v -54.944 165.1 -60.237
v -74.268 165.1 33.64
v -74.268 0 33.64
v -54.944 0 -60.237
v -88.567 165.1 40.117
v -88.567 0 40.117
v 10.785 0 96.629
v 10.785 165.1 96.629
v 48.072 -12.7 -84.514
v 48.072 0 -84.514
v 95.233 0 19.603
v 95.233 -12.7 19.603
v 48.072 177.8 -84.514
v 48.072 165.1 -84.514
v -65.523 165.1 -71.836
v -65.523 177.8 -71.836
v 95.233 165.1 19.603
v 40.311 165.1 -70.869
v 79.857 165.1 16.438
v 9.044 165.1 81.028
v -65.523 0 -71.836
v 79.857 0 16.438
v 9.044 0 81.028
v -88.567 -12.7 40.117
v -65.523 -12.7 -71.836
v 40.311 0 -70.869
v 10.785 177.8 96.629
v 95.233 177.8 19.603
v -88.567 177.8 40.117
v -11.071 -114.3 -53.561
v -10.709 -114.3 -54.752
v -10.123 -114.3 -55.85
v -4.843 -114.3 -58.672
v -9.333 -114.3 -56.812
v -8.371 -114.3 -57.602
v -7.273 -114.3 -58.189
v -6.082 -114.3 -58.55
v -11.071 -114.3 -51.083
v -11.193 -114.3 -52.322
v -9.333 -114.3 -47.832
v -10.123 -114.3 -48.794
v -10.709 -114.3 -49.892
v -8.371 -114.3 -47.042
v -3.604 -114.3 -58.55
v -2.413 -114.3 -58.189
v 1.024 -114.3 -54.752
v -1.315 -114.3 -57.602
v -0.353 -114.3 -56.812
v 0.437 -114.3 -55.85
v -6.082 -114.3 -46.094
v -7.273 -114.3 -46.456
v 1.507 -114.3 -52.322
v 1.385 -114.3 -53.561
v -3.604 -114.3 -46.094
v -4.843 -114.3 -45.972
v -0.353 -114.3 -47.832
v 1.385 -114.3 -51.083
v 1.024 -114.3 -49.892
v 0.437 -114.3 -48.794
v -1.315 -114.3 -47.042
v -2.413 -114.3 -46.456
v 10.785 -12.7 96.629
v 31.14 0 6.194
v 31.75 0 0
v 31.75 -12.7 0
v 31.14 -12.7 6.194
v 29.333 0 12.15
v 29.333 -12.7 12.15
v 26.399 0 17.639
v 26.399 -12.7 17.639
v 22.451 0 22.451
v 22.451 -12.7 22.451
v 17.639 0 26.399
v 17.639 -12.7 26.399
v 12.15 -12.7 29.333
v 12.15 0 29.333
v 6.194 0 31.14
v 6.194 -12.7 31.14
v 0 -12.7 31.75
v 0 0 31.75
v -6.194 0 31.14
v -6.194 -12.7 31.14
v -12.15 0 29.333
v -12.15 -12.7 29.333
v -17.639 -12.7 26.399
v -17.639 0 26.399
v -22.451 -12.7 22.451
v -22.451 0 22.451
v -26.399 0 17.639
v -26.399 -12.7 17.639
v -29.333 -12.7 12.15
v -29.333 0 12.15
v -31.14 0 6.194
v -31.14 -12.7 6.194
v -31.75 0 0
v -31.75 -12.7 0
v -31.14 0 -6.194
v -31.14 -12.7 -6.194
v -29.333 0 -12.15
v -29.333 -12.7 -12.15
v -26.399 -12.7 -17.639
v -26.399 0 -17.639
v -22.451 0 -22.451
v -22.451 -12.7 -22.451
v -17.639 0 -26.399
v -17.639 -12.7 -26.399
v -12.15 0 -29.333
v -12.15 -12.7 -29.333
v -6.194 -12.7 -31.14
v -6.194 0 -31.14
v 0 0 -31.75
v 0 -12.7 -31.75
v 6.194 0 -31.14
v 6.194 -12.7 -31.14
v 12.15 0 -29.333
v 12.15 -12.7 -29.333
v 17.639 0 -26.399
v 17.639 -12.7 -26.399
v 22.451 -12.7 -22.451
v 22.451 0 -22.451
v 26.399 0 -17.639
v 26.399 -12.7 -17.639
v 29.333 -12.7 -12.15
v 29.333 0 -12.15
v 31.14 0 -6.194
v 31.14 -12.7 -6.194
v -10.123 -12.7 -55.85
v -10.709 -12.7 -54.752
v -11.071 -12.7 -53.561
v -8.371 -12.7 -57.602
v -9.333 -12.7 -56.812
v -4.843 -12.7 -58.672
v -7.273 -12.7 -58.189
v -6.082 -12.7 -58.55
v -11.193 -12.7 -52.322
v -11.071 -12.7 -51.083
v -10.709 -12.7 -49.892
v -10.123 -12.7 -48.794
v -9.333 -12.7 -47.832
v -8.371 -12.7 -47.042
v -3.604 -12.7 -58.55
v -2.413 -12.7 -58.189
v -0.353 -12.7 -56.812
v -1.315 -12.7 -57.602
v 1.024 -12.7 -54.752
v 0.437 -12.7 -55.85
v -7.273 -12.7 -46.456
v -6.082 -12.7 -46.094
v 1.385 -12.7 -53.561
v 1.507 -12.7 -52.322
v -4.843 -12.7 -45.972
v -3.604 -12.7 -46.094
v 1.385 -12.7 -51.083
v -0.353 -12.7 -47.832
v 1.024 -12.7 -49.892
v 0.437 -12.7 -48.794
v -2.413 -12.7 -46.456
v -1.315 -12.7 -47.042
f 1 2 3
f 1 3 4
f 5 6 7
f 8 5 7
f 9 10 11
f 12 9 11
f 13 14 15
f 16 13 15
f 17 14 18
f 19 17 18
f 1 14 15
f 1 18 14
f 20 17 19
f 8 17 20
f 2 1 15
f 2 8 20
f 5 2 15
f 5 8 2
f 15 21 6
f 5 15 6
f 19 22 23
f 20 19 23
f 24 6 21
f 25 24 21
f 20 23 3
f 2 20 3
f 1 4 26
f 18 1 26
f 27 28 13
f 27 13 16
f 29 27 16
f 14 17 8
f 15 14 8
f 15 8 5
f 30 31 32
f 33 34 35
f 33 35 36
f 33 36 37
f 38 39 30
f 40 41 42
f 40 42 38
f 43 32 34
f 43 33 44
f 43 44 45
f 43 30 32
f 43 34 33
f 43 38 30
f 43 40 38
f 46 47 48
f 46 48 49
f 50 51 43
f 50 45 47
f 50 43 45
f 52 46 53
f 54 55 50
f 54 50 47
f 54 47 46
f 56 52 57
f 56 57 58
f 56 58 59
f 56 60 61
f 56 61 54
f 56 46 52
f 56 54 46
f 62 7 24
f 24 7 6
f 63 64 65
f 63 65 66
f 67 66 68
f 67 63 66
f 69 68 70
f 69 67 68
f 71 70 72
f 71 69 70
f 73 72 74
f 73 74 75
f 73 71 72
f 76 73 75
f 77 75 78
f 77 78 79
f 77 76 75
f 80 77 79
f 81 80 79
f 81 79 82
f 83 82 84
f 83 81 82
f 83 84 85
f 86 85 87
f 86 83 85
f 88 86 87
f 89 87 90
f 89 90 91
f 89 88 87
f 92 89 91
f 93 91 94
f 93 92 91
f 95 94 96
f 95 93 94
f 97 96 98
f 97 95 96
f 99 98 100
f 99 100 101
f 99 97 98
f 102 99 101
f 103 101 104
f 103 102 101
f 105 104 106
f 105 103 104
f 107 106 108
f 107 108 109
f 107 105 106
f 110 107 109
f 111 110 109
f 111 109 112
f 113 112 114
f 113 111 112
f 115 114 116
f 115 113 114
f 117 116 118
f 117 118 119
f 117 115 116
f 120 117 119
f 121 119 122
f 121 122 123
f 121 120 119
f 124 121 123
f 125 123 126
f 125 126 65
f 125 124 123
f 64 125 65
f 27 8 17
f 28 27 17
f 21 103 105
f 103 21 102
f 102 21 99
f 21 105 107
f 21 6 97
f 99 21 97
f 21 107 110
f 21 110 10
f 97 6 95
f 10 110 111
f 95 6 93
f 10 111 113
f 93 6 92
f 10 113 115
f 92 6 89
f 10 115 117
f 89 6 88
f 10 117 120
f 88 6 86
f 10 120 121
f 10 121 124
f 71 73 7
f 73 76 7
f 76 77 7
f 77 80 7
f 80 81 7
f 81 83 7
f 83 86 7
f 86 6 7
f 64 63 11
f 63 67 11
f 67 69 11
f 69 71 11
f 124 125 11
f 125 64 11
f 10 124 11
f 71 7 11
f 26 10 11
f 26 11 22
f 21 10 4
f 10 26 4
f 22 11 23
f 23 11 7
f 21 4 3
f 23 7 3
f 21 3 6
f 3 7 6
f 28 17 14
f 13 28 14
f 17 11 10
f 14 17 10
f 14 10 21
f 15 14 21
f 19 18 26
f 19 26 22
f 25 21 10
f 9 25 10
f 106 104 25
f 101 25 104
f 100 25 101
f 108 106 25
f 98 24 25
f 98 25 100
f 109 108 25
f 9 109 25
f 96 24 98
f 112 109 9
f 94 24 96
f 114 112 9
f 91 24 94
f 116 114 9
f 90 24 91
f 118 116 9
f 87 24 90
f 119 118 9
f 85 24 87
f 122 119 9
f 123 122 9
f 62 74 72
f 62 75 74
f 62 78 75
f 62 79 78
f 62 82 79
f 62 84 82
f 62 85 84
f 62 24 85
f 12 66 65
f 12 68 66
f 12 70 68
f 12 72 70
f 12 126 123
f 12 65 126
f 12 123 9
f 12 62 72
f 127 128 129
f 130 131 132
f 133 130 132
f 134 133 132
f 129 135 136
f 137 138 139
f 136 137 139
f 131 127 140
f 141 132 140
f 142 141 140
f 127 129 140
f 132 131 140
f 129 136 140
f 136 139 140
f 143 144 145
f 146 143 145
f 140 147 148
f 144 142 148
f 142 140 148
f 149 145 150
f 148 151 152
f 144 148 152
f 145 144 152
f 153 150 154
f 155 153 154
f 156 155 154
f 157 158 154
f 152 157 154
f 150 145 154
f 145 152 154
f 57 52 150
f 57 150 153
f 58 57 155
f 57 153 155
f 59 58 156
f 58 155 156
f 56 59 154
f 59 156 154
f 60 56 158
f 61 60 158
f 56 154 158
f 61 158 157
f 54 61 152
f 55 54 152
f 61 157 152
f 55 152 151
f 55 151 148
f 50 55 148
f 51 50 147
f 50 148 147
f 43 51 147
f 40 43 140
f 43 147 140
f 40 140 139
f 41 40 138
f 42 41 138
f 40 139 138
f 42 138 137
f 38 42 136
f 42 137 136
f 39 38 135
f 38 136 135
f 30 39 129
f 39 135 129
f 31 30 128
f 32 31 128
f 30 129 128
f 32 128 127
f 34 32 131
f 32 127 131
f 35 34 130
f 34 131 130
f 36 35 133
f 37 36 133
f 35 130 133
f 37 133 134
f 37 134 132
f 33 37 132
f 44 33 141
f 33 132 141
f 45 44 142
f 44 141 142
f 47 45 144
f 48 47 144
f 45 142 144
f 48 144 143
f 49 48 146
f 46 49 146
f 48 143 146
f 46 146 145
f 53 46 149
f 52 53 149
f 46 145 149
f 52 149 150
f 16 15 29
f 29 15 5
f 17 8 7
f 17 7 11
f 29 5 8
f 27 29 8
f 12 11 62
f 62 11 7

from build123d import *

# Parameters (mm, degrees)
F0_R     = 31.75
F1_DEPTH = 12.7
F3_DEPTH = 165.1
F5_DEPTH = 12.7
F6_R     = 6.35
F7_DEPTH = 101.6


with BuildPart() as f1:
    # F0 (on Front) → F1 (new body)
    with BuildSketch(Plane.XZ):
        Polygon((10.784969, 96.629386), (-88.567268, 40.117238), (-65.522551, -71.835569), (48.072104, -84.514061), (95.232746, 19.603007), align=None)
        Circle(F0_R, mode=Mode.SUBTRACT)
    extrude(amount=F1_DEPTH)


with BuildPart() as f3:
    # F2 (on face) → F3 (new body)
    with BuildSketch(Plane(origin=(0, 0, 0), x_dir=(-1, 0, 0), z_dir=(0, 1, 0))):
        Polygon((-10.784969, 96.629386), (-95.232746, 19.603007), (-48.072104, -84.514061), (65.522551, -71.835569), (88.567268, 40.117238), align=None)
        Polygon((-79.857048, 16.438025), (-9.043694, 81.028195), (74.267738, 33.640154), (54.94368, -60.237437), (-40.310676, -70.868937), align=None, mode=Mode.SUBTRACT)
    extrude(amount=F3_DEPTH)


with BuildPart() as f5:
    # F4 (on face) → F5 (new body)
    with BuildSketch(Plane(origin=(0, 165.1, 0), x_dir=(-1, 0, 0), z_dir=(0, 1, 0))):
        Polygon((-10.784969, 96.629386), (-95.232746, 19.603007), (-48.072104, -84.514061), (65.522551, -71.835569), (88.567268, 40.117238), align=None)
    extrude(amount=F5_DEPTH)


with BuildPart() as f7:
    # F6 (on face) → F7 (new body)
    with BuildSketch(Plane.XZ.offset(12.7)):
        with Locations((-4.842842, -52.32219)):
            Circle(F6_R)
    extrude(amount=F7_DEPTH)


solid = Compound([f1.part, f3.part, f5.part, f7.part])
